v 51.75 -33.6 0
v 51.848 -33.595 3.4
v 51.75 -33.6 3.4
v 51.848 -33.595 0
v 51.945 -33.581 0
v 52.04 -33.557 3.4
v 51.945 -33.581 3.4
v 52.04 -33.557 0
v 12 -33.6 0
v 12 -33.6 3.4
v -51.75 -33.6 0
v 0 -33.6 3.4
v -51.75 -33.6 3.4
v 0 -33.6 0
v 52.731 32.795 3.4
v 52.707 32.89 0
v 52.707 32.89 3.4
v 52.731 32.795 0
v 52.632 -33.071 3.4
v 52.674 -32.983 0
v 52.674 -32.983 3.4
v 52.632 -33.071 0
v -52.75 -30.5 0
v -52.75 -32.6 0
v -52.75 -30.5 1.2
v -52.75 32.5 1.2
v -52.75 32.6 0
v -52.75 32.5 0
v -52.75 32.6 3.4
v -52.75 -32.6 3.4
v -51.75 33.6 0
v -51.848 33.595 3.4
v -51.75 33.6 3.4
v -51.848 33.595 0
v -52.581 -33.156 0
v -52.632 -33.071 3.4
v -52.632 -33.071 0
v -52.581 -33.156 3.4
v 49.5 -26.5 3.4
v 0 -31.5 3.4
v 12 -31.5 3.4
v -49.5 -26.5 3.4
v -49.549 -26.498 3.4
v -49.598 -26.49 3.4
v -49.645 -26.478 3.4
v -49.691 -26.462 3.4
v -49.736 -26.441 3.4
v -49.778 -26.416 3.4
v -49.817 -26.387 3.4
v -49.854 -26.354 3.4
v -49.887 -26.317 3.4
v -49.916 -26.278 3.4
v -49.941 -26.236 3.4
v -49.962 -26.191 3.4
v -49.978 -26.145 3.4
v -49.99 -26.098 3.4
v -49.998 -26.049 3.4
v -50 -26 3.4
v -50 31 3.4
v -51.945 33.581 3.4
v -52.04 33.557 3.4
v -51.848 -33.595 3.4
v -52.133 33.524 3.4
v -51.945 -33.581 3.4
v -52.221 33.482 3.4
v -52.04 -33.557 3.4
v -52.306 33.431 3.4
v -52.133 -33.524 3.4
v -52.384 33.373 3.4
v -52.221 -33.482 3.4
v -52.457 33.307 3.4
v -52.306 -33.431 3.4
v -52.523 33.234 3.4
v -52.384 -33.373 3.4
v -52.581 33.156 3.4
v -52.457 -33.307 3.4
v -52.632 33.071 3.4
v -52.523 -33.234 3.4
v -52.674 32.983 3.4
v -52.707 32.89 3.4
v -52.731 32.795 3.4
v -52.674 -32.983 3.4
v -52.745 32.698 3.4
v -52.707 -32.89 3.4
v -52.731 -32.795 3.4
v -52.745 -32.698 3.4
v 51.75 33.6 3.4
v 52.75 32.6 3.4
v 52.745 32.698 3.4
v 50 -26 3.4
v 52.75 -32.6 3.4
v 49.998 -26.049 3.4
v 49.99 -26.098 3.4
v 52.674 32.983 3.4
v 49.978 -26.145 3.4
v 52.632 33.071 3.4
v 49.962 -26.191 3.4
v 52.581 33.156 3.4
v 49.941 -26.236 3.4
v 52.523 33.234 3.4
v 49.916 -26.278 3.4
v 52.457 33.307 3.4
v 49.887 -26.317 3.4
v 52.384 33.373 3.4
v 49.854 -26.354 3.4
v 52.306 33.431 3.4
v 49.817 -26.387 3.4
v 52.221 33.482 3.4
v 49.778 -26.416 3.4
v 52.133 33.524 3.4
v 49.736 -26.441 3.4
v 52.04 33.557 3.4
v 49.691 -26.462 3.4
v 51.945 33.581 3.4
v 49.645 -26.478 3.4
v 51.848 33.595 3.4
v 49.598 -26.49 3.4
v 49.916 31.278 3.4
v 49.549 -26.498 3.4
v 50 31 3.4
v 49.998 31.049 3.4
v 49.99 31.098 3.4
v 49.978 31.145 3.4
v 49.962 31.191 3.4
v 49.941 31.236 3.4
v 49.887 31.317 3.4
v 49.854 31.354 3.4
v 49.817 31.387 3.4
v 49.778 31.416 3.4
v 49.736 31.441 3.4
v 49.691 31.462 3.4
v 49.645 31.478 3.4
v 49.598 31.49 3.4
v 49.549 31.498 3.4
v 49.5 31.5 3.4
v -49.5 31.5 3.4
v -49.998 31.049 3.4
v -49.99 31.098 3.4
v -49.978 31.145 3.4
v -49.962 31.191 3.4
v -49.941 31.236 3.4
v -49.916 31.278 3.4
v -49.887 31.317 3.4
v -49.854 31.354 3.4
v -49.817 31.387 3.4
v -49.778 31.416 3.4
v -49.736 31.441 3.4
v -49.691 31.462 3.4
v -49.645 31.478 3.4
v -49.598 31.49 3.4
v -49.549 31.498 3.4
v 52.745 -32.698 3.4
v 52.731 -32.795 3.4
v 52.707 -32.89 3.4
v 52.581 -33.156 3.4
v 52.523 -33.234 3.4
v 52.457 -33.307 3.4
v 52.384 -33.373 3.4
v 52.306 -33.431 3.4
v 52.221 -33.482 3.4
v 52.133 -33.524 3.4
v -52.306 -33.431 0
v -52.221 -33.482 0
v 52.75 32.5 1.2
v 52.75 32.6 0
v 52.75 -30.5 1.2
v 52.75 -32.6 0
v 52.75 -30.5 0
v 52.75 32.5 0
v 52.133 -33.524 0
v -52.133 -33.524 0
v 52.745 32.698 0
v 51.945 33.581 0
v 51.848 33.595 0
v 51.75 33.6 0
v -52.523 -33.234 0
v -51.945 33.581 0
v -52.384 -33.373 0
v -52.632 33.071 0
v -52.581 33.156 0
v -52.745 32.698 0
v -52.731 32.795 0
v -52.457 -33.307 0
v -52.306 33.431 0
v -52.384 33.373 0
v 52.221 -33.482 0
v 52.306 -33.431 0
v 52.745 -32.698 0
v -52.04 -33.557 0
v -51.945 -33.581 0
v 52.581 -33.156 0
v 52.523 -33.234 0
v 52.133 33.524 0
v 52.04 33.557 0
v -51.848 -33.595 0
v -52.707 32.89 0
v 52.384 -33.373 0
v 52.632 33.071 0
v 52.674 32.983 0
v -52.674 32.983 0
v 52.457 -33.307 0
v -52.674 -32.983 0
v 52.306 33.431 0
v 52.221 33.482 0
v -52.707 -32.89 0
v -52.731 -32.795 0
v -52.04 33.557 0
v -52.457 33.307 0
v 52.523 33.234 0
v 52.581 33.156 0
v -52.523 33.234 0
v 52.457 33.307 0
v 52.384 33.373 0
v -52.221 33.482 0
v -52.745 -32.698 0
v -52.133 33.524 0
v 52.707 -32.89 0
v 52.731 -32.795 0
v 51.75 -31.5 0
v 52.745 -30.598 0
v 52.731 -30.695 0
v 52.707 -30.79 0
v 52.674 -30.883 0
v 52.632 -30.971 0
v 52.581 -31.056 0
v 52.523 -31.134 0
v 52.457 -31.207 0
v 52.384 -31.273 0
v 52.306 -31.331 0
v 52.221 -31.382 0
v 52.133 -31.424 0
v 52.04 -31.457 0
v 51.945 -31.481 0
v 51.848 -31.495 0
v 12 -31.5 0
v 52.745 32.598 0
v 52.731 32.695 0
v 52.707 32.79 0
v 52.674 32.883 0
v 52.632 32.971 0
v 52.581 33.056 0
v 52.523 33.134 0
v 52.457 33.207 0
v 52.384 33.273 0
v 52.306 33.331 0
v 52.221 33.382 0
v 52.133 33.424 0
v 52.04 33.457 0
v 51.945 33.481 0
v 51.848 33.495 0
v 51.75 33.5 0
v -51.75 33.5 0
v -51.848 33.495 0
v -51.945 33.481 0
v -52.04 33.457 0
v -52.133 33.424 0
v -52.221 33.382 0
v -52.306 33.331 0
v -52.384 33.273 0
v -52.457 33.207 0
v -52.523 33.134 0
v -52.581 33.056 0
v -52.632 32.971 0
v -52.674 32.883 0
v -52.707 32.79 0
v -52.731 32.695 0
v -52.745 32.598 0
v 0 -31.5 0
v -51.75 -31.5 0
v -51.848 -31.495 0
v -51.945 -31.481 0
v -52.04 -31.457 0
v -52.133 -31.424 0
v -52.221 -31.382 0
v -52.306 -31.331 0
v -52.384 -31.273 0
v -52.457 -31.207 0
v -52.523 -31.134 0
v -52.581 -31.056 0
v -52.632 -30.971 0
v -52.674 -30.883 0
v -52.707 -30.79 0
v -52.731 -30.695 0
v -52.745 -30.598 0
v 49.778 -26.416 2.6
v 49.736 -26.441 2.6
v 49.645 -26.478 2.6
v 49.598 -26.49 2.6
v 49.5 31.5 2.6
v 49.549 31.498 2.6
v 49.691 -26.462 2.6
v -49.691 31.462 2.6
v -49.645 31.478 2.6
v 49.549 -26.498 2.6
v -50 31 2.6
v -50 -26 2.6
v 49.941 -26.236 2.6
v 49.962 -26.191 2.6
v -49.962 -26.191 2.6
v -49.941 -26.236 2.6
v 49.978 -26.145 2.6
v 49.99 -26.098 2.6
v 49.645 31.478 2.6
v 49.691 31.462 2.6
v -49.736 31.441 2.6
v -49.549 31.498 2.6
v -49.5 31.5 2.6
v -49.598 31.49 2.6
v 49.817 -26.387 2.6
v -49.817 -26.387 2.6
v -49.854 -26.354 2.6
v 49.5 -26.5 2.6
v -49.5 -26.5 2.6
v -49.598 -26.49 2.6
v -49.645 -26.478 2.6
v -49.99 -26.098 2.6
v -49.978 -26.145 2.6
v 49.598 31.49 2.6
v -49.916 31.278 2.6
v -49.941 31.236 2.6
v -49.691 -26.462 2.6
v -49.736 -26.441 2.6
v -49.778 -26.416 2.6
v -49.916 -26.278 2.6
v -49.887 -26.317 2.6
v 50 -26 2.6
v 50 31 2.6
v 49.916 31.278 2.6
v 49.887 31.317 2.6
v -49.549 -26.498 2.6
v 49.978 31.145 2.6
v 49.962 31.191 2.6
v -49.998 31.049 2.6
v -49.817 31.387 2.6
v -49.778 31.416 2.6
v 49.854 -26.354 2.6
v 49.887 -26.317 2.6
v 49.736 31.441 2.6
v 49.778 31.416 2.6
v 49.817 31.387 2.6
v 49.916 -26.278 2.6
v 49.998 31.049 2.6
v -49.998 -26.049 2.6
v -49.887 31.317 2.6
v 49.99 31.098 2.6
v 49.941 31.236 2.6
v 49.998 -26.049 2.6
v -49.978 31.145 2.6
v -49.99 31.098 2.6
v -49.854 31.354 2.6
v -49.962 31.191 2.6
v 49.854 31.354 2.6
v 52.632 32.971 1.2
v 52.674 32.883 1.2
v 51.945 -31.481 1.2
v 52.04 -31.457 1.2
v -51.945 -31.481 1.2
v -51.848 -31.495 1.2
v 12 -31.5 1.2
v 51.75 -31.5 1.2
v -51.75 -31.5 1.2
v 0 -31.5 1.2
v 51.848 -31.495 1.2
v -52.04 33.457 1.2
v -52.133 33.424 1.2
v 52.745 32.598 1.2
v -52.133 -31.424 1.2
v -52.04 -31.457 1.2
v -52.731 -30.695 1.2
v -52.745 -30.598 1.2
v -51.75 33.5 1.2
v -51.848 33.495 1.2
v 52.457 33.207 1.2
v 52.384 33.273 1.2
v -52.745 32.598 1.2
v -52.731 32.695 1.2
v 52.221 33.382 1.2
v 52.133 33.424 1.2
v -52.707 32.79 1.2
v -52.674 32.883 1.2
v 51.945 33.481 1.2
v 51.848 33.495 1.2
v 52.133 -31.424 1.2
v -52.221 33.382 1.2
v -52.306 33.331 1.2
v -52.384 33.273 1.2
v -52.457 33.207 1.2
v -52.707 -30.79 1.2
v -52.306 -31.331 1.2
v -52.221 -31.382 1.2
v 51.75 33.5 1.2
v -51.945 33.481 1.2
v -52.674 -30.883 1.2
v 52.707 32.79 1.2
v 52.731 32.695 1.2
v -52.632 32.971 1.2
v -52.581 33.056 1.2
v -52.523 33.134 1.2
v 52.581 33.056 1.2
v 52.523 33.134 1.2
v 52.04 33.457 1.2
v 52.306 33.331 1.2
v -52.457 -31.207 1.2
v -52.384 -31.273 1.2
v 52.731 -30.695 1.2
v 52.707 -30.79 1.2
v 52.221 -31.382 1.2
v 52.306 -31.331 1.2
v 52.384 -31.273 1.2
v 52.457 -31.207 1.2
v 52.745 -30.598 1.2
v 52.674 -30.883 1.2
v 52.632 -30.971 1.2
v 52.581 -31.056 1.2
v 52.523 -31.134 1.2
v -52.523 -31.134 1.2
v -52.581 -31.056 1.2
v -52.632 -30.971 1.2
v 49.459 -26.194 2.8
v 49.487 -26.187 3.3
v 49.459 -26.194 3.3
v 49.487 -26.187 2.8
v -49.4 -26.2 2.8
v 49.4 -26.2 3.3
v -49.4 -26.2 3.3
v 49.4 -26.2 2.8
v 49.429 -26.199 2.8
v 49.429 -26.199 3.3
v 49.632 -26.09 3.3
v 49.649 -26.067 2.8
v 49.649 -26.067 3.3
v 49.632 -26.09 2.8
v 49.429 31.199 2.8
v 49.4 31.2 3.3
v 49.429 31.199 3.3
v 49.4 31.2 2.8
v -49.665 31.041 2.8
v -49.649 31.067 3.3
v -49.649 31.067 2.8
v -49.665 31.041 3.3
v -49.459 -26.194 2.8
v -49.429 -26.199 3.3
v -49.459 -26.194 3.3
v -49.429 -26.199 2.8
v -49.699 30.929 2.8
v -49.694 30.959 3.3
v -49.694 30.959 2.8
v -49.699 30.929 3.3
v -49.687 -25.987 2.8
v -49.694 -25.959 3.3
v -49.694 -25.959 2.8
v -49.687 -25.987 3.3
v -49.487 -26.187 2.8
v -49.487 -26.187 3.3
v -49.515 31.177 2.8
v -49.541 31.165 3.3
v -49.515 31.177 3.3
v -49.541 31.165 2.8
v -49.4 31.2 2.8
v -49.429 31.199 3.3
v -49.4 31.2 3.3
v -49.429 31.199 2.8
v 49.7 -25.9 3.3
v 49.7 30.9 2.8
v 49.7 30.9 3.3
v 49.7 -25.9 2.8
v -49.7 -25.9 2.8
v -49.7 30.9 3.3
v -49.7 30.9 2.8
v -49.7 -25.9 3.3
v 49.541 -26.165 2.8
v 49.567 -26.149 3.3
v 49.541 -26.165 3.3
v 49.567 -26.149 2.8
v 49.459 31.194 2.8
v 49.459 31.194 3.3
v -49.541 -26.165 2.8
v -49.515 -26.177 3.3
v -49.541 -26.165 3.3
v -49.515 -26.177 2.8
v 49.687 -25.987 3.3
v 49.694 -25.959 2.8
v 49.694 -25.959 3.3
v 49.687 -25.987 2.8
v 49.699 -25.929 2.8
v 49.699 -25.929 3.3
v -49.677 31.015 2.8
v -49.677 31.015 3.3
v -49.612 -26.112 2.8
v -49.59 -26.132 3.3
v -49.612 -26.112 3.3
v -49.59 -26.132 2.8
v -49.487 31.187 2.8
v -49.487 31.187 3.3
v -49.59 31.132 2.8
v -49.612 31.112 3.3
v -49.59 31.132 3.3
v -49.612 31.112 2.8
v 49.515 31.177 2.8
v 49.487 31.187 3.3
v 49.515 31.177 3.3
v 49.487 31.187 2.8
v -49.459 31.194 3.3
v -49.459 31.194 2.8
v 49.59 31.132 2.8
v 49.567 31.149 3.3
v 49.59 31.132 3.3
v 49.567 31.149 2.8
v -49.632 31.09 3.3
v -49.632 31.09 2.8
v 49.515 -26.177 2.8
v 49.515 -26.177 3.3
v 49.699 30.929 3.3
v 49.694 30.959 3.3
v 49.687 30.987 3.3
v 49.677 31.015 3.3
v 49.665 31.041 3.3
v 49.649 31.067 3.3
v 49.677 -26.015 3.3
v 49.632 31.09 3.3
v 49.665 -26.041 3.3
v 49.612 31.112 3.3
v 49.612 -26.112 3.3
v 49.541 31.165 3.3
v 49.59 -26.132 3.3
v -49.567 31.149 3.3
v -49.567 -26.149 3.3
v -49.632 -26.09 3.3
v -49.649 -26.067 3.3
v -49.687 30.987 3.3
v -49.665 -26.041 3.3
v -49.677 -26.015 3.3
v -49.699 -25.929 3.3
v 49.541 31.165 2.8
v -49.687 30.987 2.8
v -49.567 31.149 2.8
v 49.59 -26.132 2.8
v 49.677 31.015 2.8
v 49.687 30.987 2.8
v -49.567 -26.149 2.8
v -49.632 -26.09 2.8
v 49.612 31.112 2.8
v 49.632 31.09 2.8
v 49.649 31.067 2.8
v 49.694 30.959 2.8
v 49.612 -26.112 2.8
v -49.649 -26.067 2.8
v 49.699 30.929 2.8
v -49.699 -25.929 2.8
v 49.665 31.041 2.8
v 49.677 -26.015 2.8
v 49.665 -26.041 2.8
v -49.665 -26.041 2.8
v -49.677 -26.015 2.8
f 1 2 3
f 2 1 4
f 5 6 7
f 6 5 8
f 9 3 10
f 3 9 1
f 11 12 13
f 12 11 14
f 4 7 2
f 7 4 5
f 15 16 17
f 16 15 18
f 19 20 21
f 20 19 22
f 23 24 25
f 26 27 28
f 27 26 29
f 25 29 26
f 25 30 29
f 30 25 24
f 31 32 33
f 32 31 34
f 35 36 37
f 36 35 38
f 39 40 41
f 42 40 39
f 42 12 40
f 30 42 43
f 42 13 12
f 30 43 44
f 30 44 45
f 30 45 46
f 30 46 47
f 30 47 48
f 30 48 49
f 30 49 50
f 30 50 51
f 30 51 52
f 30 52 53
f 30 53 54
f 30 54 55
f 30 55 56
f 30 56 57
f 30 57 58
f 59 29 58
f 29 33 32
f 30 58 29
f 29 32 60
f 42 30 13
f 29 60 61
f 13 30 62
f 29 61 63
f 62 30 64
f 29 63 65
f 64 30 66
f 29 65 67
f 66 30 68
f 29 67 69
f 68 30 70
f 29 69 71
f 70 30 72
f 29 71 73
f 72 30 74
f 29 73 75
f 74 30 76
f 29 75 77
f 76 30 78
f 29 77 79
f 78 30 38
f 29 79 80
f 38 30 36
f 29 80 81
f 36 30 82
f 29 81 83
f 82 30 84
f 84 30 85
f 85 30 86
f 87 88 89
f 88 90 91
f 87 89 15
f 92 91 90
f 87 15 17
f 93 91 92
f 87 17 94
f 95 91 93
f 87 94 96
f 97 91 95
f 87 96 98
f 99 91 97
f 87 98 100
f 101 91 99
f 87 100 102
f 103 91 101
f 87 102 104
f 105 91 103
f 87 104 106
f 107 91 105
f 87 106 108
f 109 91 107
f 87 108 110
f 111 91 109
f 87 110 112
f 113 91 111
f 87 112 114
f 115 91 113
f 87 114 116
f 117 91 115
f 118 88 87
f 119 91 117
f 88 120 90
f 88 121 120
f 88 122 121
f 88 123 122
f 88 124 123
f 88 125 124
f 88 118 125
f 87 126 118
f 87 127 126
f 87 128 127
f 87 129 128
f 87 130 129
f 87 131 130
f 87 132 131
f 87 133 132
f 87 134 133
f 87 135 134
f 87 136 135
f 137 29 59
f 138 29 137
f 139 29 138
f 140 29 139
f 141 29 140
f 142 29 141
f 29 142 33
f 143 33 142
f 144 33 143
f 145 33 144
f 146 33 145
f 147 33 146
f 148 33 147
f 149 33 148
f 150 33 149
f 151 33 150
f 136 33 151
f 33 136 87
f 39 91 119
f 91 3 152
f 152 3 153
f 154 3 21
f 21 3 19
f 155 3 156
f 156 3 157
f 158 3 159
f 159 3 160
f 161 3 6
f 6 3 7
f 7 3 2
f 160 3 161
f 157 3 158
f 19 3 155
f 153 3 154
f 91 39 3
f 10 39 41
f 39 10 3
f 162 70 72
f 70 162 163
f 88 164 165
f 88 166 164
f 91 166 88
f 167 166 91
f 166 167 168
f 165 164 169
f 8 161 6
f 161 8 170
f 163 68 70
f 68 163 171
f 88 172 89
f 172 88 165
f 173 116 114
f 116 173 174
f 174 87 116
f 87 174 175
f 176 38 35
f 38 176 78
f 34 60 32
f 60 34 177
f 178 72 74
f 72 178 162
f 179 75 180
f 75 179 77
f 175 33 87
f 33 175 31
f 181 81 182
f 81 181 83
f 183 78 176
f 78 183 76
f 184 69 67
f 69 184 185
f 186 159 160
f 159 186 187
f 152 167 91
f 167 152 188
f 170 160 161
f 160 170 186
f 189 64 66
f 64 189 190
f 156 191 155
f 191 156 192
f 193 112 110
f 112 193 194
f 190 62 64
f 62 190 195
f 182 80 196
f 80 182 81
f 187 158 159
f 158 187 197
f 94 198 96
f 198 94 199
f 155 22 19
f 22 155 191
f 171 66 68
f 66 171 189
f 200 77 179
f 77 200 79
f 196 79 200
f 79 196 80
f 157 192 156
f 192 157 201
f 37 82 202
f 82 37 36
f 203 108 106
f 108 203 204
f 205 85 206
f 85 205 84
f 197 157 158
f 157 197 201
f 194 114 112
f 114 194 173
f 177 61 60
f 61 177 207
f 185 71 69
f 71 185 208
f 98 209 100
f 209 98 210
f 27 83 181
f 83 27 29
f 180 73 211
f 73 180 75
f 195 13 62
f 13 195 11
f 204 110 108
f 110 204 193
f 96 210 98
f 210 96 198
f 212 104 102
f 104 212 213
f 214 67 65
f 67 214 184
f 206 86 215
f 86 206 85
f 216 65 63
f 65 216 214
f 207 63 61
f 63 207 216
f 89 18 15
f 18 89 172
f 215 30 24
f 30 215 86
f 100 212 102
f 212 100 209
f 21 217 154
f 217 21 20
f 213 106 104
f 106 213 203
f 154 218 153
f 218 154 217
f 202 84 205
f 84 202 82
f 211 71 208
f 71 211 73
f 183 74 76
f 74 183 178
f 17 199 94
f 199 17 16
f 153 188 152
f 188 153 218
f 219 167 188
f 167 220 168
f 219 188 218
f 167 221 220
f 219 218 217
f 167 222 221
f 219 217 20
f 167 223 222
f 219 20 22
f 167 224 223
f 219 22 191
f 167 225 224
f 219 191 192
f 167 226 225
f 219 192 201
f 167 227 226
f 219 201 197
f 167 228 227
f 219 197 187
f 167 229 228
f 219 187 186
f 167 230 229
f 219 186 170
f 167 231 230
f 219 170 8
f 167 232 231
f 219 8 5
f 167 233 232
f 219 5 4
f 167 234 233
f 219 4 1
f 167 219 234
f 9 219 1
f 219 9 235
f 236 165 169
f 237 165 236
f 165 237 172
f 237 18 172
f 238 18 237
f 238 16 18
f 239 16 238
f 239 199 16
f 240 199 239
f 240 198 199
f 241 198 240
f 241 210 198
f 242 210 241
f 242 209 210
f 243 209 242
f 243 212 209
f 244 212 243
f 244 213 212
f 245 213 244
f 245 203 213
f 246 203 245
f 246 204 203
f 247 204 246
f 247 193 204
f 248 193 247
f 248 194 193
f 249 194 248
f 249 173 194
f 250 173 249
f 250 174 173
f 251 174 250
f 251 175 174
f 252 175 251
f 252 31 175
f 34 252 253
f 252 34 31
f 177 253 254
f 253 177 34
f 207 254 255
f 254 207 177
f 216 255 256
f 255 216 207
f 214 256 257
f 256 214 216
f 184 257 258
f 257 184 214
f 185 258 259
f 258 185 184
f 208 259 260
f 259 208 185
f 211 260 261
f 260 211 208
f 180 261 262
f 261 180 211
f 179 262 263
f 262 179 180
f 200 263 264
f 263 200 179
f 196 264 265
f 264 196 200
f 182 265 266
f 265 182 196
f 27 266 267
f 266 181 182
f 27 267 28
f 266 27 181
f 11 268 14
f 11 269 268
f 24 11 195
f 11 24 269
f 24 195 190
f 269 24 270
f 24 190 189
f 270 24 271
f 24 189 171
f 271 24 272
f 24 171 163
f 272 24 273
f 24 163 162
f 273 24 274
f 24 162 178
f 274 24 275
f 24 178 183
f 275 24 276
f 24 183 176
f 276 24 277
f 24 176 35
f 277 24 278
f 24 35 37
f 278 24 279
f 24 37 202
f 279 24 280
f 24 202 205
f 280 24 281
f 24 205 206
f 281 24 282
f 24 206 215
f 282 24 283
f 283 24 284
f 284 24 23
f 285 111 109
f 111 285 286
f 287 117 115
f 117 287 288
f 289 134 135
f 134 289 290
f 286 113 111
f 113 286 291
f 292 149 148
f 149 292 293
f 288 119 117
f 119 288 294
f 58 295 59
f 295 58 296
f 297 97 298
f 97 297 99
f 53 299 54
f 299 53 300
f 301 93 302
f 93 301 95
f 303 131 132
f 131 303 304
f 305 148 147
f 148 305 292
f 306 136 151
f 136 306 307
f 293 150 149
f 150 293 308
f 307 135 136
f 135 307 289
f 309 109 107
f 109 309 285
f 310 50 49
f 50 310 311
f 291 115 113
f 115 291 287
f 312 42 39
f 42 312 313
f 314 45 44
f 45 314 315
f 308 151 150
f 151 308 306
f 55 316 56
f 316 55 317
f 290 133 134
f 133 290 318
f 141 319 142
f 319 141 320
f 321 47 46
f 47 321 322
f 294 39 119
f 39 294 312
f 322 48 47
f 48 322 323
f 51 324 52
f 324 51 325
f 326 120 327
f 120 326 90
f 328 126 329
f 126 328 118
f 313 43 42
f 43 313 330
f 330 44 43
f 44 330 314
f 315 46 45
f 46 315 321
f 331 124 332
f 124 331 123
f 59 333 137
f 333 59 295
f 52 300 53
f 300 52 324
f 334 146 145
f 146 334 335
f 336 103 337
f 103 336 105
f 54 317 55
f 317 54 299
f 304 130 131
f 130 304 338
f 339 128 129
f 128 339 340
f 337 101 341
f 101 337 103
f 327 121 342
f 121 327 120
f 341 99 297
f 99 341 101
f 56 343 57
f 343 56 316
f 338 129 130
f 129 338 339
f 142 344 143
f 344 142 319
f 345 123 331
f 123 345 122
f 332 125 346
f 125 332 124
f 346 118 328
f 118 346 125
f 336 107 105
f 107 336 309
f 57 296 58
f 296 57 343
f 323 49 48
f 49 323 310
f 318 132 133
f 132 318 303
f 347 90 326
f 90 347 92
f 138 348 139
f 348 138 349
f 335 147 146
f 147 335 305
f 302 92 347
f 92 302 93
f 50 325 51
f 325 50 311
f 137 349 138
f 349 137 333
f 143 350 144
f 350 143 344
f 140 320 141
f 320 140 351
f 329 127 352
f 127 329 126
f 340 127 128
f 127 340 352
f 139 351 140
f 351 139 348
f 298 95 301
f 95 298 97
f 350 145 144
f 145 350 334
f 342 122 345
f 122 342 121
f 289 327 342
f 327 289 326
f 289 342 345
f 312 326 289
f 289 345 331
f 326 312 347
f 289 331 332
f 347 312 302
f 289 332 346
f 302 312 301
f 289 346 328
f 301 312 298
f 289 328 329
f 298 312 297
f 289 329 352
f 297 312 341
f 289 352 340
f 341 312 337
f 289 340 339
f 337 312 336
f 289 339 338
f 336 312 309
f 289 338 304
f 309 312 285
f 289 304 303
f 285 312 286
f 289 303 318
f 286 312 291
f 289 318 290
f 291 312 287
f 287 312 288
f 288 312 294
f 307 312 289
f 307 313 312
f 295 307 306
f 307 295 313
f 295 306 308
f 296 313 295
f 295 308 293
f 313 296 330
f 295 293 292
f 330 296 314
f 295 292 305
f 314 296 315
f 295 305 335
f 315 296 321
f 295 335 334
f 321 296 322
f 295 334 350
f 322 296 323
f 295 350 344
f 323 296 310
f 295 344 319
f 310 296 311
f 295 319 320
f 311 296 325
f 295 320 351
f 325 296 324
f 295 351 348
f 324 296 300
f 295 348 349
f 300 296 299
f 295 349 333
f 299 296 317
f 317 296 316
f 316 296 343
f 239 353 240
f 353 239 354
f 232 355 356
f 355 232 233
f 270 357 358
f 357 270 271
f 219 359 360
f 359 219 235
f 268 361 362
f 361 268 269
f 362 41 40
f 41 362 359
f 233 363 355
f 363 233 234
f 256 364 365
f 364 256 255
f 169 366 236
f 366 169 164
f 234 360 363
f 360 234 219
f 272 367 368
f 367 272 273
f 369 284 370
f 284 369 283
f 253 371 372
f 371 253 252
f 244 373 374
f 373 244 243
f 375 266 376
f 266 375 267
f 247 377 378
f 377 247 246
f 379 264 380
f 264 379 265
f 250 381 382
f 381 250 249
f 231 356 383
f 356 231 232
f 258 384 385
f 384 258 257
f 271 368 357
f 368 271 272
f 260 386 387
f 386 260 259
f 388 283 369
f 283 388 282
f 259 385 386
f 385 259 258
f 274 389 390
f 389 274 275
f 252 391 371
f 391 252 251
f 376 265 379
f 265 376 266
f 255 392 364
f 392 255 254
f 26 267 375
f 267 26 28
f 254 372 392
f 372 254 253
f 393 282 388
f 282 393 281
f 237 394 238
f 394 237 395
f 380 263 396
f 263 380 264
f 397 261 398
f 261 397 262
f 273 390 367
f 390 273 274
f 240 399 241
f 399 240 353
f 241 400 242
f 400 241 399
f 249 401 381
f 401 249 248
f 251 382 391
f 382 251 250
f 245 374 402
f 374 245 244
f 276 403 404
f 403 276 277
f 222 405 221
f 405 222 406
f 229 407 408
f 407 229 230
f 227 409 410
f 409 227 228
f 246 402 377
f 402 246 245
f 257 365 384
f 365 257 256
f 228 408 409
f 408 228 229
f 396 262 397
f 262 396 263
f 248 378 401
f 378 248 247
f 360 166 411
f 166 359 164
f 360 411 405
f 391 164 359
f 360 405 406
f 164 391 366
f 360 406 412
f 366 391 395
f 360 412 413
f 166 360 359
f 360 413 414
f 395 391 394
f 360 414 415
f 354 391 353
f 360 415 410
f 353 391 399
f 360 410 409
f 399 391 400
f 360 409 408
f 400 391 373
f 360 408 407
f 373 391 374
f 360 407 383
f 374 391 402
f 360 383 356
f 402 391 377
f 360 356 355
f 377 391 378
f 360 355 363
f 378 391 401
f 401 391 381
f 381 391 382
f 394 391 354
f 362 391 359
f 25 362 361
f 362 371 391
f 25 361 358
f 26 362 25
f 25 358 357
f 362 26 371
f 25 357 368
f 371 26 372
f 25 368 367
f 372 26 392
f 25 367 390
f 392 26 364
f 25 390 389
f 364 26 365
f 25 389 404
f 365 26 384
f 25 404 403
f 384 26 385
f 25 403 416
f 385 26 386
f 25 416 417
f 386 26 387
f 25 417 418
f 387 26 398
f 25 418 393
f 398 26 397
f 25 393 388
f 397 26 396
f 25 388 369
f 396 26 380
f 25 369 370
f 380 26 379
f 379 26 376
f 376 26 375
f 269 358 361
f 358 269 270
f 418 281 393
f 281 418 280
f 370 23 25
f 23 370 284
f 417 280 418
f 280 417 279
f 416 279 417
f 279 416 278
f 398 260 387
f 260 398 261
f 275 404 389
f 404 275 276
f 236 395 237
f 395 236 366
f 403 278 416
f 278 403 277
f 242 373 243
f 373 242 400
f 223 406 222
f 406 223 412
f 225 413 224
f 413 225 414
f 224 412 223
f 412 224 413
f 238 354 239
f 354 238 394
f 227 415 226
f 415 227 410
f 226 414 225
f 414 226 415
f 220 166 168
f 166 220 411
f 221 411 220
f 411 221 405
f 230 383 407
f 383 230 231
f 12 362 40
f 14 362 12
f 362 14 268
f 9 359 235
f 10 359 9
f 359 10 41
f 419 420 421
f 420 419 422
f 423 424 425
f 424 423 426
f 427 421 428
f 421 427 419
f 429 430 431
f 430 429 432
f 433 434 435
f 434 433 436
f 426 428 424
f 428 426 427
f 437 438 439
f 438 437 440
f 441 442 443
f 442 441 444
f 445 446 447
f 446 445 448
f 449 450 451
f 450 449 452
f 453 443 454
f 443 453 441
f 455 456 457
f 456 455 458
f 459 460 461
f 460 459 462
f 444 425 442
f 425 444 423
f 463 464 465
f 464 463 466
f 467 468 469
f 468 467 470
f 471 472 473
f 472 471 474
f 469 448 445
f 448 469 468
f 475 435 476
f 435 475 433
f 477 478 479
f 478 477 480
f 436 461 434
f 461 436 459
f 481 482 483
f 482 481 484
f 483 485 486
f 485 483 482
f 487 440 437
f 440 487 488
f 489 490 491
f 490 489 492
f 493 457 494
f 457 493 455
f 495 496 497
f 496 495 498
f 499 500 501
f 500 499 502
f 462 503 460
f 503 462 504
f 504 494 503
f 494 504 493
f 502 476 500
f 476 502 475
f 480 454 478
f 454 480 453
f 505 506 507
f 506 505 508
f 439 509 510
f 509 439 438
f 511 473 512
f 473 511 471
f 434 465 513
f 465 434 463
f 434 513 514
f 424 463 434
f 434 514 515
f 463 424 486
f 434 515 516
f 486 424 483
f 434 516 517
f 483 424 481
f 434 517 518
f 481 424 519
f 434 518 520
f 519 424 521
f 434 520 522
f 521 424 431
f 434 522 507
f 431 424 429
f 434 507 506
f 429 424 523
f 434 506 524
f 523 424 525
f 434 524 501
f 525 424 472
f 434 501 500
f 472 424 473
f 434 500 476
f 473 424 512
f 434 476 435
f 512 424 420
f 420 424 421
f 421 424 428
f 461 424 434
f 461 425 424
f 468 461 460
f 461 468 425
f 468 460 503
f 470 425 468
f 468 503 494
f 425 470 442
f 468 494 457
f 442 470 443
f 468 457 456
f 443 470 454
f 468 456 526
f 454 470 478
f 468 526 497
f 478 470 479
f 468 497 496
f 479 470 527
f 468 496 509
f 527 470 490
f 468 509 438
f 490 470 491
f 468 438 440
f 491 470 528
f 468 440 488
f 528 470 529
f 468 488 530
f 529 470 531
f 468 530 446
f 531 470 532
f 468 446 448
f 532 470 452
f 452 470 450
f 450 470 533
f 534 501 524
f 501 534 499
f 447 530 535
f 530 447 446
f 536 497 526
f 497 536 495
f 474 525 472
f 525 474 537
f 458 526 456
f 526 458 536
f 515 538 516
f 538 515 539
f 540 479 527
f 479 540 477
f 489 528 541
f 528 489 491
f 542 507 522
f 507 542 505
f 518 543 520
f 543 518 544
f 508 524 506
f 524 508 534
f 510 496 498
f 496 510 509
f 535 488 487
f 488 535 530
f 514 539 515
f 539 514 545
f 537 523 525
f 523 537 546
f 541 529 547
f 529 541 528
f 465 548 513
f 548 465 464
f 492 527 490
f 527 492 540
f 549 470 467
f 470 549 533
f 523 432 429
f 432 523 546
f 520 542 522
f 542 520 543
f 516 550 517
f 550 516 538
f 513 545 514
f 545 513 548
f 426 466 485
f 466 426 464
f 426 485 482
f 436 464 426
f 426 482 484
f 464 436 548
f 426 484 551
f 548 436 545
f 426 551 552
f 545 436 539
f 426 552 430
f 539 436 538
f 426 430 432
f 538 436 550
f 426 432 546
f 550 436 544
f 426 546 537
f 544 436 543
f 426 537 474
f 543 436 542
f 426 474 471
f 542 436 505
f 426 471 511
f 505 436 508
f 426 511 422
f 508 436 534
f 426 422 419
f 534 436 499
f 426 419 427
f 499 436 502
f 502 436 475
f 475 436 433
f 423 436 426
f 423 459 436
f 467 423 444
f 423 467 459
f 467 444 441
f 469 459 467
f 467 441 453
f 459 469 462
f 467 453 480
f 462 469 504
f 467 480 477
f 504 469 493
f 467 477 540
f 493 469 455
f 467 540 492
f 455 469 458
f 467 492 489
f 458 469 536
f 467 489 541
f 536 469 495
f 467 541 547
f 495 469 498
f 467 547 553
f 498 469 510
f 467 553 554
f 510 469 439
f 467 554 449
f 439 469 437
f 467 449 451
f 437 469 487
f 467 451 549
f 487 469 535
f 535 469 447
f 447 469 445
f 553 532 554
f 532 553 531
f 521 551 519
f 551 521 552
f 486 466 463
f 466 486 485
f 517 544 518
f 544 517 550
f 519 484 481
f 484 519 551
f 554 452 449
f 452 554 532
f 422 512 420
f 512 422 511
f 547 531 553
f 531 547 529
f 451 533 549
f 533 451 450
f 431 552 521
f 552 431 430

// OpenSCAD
$fn = 64;

module rounded_rect_2d(w, h, r) {
    r2 = min(r, min(w, h)/2);
    offset(r=r2) offset(delta=-r2) square([w, h], center=true);
}

module lcd_display_4p3() {
    // Dimensions (mm)
    body_w = 105.5;
    body_h = 67.2;
    body_t = 3.4;

    // Screen window (approx from given coords)
    // [[-50, -26.5], [50, 31.5, 0.5]]
    win_x1 = -50;
    win_y1 = -26.5;
    win_x2 =  50;
    win_y2 =  31.5;
    win_r  =  0.5;

    win_w = win_x2 - win_x1;
    win_h = win_y2 - win_y1;
    win_cx = (win_x1 + win_x2)/2;
    win_cy = (win_y1 + win_y2)/2;

    // Inner recess / back feature (approx from given coords)
    // [[-105.5 / 2, -65 / 2 + 1], [105.5 / 2, 65 / 2 + 1, 1]]
    recess_x1 = -body_w/2;
    recess_y1 = -65/2 + 1;
    recess_x2 =  body_w/2;
    recess_y2 =  65/2 + 1;
    recess_r  =  1;

    recess_w = recess_x2 - recess_x1;
    recess_h = recess_y2 - recess_y1;
    recess_cx = (recess_x1 + recess_x2)/2;
    recess_cy = (recess_y1 + recess_y2)/2;

    // Small bottom feature (approx from given coords)
    // [[0, -34.5], [12, -31.5]]
    tab_x1 = 0;
    tab_y1 = -34.5;
    tab_x2 = 12;
    tab_y2 = -31.5;

    tab_w = abs(tab_x2 - tab_x1);
    tab_h = abs(tab_y2 - tab_y1);
    tab_cx = (tab_x1 + tab_x2)/2;
    tab_cy = (tab_y1 + tab_y2)/2;

    difference() {
        // Main body
        color([0.15,0.15,0.15])
        linear_extrude(height=body_t)
            rounded_rect_2d(body_w, body_h, 1.0);

        // Front screen window cut (shallow)
        translate([win_cx, win_cy, body_t - 0.8])
            linear_extrude(height=1.0)
                rounded_rect_2d(win_w, win_h, win_r);

        // Back recess (deeper pocket from bottom)
        translate([recess_cx, recess_cy, 0])
            linear_extrude(height=1.2)
                rounded_rect_2d(recess_w, recess_h, recess_r);

        // Small bottom notch/feature (through cut)
        translate([tab_cx, tab_cy, 0])
            linear_extrude(height=body_t + 0.2)
                square([tab_w, tab_h], center=true);
    }

    // Add a "glass" plate in the window area
    color([0.05,0.1,0.12,0.6])
    translate([win_cx, win_cy, body_t - 0.6])
        linear_extrude(height=0.5)
            rounded_rect_2d(win_w - 0.6, win_h - 0.6, max(0, win_r - 0.2));
}

translate([0,0,0]) lcd_display_4p3();
